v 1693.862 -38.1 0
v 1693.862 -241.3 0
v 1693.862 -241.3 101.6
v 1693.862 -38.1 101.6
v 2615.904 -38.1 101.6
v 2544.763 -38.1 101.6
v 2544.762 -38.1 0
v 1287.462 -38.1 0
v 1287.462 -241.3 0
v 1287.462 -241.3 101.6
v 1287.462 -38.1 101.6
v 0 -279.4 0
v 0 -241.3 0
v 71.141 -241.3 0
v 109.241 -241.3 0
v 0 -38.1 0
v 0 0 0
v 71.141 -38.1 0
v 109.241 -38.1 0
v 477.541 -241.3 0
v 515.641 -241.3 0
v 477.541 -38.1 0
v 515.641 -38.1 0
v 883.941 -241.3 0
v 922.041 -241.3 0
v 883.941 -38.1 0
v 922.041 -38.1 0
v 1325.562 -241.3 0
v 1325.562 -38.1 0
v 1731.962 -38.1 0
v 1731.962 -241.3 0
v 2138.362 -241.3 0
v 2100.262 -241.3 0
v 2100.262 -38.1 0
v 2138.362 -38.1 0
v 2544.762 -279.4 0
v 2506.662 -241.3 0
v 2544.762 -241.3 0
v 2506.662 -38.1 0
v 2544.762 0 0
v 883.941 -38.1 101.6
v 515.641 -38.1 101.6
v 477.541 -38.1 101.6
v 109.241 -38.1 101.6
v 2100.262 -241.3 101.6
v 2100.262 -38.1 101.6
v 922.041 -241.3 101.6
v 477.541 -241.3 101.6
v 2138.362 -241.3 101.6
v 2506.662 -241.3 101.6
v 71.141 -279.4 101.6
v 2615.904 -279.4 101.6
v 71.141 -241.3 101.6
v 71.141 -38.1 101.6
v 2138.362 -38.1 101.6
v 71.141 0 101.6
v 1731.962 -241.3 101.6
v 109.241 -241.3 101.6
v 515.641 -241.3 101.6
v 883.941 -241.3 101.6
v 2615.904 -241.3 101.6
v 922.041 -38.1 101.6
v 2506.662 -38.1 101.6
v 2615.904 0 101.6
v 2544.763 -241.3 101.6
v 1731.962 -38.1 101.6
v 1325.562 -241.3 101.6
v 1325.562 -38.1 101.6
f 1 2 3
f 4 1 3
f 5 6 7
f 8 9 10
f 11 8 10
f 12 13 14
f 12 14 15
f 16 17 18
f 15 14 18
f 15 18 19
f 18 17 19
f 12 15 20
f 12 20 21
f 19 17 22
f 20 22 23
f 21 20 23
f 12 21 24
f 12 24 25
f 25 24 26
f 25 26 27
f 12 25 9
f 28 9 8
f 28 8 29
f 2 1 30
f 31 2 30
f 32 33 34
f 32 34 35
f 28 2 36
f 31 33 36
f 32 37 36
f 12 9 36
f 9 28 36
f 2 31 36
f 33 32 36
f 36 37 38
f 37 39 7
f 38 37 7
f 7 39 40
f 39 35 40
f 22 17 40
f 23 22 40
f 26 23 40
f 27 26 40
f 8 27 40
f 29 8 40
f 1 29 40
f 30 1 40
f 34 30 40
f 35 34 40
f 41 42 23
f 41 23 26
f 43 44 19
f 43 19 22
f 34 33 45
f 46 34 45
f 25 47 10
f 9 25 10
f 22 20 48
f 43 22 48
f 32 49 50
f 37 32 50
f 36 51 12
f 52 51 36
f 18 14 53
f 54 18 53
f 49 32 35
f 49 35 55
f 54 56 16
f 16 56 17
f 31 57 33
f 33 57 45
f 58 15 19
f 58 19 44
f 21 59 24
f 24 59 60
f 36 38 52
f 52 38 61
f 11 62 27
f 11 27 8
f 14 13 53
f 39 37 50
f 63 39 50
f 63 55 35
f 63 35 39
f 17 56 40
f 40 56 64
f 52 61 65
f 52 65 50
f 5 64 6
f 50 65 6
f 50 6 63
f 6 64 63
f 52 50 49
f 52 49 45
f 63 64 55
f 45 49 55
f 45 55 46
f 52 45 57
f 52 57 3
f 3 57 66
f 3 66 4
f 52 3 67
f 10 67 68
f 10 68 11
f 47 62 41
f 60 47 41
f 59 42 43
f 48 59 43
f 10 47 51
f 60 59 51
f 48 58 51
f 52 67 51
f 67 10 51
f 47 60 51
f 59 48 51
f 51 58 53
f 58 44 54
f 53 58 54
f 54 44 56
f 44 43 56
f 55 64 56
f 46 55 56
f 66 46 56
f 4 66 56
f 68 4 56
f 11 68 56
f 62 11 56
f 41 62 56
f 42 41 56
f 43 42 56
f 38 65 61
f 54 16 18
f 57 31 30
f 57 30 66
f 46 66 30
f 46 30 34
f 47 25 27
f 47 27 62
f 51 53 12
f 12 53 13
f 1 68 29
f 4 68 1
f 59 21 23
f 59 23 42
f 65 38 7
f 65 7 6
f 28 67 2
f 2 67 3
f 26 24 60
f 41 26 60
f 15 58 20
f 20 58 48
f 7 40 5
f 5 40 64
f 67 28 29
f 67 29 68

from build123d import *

# Parameters (mm, degrees)
F1_DEPTH = 38.1
F2_W     = 38.1
F2_H     = 101.6
F3_DEPTH = 203.2
F4_W     = 38.1
F4_H     = 101.6
F5_DEPTH = 38.1


# Not quite as in the source:
# - a feature names something its author has since deleted; it is built from what else it names


with BuildPart() as f1:
    # F0 (on Front) → F1 (new body)
    with BuildSketch(Plane.XZ):
        Polygon((71.1410858821, 101.6), (0, 0), (2544.7625, 0), (2615.9035858821, 101.6), align=None)
    extrude(amount=F1_DEPTH)

    # F2 (on face) → F3 (join)
    with BuildSketch(Plane.XZ.offset(38.1)):
        with Locations((90.1910858821, 50.8)):
            Rectangle(F2_W, F2_H)
        with Locations((496.5910858821, 50.8)):
            Rectangle(F2_W, F2_H)
        with Locations((902.9910858821, 50.8)):
            Rectangle(F2_W, F2_H)
        with Locations((1306.5125, 50.8)):
            Rectangle(F2_W, F2_H)
        with Locations((1712.9125, 50.8)):
            Rectangle(F2_W, F2_H)
        with Locations((2119.3125, 50.8)):
            Rectangle(F2_W, F2_H)
        with Locations((2525.7125, 50.8)):
            Rectangle(F2_W, F2_H)
    extrude(amount=F3_DEPTH)

    # F4 (on face) → F5 (join)
    with BuildSketch(Plane.XZ.offset(241.3)):
        Polygon((2615.9035858821, 101.6), (109.2410858821, 101.6), (109.2410858821, 0), (2544.7625, 0), align=None)
        with Locations((90.1910858821, 50.8)):
            Rectangle(F4_W, F4_H)
        Polygon((71.1410858821, 101.6), (0, 0), (71.1410858821, 0), align=None)
    extrude(amount=F5_DEPTH)


solid = f1.part
